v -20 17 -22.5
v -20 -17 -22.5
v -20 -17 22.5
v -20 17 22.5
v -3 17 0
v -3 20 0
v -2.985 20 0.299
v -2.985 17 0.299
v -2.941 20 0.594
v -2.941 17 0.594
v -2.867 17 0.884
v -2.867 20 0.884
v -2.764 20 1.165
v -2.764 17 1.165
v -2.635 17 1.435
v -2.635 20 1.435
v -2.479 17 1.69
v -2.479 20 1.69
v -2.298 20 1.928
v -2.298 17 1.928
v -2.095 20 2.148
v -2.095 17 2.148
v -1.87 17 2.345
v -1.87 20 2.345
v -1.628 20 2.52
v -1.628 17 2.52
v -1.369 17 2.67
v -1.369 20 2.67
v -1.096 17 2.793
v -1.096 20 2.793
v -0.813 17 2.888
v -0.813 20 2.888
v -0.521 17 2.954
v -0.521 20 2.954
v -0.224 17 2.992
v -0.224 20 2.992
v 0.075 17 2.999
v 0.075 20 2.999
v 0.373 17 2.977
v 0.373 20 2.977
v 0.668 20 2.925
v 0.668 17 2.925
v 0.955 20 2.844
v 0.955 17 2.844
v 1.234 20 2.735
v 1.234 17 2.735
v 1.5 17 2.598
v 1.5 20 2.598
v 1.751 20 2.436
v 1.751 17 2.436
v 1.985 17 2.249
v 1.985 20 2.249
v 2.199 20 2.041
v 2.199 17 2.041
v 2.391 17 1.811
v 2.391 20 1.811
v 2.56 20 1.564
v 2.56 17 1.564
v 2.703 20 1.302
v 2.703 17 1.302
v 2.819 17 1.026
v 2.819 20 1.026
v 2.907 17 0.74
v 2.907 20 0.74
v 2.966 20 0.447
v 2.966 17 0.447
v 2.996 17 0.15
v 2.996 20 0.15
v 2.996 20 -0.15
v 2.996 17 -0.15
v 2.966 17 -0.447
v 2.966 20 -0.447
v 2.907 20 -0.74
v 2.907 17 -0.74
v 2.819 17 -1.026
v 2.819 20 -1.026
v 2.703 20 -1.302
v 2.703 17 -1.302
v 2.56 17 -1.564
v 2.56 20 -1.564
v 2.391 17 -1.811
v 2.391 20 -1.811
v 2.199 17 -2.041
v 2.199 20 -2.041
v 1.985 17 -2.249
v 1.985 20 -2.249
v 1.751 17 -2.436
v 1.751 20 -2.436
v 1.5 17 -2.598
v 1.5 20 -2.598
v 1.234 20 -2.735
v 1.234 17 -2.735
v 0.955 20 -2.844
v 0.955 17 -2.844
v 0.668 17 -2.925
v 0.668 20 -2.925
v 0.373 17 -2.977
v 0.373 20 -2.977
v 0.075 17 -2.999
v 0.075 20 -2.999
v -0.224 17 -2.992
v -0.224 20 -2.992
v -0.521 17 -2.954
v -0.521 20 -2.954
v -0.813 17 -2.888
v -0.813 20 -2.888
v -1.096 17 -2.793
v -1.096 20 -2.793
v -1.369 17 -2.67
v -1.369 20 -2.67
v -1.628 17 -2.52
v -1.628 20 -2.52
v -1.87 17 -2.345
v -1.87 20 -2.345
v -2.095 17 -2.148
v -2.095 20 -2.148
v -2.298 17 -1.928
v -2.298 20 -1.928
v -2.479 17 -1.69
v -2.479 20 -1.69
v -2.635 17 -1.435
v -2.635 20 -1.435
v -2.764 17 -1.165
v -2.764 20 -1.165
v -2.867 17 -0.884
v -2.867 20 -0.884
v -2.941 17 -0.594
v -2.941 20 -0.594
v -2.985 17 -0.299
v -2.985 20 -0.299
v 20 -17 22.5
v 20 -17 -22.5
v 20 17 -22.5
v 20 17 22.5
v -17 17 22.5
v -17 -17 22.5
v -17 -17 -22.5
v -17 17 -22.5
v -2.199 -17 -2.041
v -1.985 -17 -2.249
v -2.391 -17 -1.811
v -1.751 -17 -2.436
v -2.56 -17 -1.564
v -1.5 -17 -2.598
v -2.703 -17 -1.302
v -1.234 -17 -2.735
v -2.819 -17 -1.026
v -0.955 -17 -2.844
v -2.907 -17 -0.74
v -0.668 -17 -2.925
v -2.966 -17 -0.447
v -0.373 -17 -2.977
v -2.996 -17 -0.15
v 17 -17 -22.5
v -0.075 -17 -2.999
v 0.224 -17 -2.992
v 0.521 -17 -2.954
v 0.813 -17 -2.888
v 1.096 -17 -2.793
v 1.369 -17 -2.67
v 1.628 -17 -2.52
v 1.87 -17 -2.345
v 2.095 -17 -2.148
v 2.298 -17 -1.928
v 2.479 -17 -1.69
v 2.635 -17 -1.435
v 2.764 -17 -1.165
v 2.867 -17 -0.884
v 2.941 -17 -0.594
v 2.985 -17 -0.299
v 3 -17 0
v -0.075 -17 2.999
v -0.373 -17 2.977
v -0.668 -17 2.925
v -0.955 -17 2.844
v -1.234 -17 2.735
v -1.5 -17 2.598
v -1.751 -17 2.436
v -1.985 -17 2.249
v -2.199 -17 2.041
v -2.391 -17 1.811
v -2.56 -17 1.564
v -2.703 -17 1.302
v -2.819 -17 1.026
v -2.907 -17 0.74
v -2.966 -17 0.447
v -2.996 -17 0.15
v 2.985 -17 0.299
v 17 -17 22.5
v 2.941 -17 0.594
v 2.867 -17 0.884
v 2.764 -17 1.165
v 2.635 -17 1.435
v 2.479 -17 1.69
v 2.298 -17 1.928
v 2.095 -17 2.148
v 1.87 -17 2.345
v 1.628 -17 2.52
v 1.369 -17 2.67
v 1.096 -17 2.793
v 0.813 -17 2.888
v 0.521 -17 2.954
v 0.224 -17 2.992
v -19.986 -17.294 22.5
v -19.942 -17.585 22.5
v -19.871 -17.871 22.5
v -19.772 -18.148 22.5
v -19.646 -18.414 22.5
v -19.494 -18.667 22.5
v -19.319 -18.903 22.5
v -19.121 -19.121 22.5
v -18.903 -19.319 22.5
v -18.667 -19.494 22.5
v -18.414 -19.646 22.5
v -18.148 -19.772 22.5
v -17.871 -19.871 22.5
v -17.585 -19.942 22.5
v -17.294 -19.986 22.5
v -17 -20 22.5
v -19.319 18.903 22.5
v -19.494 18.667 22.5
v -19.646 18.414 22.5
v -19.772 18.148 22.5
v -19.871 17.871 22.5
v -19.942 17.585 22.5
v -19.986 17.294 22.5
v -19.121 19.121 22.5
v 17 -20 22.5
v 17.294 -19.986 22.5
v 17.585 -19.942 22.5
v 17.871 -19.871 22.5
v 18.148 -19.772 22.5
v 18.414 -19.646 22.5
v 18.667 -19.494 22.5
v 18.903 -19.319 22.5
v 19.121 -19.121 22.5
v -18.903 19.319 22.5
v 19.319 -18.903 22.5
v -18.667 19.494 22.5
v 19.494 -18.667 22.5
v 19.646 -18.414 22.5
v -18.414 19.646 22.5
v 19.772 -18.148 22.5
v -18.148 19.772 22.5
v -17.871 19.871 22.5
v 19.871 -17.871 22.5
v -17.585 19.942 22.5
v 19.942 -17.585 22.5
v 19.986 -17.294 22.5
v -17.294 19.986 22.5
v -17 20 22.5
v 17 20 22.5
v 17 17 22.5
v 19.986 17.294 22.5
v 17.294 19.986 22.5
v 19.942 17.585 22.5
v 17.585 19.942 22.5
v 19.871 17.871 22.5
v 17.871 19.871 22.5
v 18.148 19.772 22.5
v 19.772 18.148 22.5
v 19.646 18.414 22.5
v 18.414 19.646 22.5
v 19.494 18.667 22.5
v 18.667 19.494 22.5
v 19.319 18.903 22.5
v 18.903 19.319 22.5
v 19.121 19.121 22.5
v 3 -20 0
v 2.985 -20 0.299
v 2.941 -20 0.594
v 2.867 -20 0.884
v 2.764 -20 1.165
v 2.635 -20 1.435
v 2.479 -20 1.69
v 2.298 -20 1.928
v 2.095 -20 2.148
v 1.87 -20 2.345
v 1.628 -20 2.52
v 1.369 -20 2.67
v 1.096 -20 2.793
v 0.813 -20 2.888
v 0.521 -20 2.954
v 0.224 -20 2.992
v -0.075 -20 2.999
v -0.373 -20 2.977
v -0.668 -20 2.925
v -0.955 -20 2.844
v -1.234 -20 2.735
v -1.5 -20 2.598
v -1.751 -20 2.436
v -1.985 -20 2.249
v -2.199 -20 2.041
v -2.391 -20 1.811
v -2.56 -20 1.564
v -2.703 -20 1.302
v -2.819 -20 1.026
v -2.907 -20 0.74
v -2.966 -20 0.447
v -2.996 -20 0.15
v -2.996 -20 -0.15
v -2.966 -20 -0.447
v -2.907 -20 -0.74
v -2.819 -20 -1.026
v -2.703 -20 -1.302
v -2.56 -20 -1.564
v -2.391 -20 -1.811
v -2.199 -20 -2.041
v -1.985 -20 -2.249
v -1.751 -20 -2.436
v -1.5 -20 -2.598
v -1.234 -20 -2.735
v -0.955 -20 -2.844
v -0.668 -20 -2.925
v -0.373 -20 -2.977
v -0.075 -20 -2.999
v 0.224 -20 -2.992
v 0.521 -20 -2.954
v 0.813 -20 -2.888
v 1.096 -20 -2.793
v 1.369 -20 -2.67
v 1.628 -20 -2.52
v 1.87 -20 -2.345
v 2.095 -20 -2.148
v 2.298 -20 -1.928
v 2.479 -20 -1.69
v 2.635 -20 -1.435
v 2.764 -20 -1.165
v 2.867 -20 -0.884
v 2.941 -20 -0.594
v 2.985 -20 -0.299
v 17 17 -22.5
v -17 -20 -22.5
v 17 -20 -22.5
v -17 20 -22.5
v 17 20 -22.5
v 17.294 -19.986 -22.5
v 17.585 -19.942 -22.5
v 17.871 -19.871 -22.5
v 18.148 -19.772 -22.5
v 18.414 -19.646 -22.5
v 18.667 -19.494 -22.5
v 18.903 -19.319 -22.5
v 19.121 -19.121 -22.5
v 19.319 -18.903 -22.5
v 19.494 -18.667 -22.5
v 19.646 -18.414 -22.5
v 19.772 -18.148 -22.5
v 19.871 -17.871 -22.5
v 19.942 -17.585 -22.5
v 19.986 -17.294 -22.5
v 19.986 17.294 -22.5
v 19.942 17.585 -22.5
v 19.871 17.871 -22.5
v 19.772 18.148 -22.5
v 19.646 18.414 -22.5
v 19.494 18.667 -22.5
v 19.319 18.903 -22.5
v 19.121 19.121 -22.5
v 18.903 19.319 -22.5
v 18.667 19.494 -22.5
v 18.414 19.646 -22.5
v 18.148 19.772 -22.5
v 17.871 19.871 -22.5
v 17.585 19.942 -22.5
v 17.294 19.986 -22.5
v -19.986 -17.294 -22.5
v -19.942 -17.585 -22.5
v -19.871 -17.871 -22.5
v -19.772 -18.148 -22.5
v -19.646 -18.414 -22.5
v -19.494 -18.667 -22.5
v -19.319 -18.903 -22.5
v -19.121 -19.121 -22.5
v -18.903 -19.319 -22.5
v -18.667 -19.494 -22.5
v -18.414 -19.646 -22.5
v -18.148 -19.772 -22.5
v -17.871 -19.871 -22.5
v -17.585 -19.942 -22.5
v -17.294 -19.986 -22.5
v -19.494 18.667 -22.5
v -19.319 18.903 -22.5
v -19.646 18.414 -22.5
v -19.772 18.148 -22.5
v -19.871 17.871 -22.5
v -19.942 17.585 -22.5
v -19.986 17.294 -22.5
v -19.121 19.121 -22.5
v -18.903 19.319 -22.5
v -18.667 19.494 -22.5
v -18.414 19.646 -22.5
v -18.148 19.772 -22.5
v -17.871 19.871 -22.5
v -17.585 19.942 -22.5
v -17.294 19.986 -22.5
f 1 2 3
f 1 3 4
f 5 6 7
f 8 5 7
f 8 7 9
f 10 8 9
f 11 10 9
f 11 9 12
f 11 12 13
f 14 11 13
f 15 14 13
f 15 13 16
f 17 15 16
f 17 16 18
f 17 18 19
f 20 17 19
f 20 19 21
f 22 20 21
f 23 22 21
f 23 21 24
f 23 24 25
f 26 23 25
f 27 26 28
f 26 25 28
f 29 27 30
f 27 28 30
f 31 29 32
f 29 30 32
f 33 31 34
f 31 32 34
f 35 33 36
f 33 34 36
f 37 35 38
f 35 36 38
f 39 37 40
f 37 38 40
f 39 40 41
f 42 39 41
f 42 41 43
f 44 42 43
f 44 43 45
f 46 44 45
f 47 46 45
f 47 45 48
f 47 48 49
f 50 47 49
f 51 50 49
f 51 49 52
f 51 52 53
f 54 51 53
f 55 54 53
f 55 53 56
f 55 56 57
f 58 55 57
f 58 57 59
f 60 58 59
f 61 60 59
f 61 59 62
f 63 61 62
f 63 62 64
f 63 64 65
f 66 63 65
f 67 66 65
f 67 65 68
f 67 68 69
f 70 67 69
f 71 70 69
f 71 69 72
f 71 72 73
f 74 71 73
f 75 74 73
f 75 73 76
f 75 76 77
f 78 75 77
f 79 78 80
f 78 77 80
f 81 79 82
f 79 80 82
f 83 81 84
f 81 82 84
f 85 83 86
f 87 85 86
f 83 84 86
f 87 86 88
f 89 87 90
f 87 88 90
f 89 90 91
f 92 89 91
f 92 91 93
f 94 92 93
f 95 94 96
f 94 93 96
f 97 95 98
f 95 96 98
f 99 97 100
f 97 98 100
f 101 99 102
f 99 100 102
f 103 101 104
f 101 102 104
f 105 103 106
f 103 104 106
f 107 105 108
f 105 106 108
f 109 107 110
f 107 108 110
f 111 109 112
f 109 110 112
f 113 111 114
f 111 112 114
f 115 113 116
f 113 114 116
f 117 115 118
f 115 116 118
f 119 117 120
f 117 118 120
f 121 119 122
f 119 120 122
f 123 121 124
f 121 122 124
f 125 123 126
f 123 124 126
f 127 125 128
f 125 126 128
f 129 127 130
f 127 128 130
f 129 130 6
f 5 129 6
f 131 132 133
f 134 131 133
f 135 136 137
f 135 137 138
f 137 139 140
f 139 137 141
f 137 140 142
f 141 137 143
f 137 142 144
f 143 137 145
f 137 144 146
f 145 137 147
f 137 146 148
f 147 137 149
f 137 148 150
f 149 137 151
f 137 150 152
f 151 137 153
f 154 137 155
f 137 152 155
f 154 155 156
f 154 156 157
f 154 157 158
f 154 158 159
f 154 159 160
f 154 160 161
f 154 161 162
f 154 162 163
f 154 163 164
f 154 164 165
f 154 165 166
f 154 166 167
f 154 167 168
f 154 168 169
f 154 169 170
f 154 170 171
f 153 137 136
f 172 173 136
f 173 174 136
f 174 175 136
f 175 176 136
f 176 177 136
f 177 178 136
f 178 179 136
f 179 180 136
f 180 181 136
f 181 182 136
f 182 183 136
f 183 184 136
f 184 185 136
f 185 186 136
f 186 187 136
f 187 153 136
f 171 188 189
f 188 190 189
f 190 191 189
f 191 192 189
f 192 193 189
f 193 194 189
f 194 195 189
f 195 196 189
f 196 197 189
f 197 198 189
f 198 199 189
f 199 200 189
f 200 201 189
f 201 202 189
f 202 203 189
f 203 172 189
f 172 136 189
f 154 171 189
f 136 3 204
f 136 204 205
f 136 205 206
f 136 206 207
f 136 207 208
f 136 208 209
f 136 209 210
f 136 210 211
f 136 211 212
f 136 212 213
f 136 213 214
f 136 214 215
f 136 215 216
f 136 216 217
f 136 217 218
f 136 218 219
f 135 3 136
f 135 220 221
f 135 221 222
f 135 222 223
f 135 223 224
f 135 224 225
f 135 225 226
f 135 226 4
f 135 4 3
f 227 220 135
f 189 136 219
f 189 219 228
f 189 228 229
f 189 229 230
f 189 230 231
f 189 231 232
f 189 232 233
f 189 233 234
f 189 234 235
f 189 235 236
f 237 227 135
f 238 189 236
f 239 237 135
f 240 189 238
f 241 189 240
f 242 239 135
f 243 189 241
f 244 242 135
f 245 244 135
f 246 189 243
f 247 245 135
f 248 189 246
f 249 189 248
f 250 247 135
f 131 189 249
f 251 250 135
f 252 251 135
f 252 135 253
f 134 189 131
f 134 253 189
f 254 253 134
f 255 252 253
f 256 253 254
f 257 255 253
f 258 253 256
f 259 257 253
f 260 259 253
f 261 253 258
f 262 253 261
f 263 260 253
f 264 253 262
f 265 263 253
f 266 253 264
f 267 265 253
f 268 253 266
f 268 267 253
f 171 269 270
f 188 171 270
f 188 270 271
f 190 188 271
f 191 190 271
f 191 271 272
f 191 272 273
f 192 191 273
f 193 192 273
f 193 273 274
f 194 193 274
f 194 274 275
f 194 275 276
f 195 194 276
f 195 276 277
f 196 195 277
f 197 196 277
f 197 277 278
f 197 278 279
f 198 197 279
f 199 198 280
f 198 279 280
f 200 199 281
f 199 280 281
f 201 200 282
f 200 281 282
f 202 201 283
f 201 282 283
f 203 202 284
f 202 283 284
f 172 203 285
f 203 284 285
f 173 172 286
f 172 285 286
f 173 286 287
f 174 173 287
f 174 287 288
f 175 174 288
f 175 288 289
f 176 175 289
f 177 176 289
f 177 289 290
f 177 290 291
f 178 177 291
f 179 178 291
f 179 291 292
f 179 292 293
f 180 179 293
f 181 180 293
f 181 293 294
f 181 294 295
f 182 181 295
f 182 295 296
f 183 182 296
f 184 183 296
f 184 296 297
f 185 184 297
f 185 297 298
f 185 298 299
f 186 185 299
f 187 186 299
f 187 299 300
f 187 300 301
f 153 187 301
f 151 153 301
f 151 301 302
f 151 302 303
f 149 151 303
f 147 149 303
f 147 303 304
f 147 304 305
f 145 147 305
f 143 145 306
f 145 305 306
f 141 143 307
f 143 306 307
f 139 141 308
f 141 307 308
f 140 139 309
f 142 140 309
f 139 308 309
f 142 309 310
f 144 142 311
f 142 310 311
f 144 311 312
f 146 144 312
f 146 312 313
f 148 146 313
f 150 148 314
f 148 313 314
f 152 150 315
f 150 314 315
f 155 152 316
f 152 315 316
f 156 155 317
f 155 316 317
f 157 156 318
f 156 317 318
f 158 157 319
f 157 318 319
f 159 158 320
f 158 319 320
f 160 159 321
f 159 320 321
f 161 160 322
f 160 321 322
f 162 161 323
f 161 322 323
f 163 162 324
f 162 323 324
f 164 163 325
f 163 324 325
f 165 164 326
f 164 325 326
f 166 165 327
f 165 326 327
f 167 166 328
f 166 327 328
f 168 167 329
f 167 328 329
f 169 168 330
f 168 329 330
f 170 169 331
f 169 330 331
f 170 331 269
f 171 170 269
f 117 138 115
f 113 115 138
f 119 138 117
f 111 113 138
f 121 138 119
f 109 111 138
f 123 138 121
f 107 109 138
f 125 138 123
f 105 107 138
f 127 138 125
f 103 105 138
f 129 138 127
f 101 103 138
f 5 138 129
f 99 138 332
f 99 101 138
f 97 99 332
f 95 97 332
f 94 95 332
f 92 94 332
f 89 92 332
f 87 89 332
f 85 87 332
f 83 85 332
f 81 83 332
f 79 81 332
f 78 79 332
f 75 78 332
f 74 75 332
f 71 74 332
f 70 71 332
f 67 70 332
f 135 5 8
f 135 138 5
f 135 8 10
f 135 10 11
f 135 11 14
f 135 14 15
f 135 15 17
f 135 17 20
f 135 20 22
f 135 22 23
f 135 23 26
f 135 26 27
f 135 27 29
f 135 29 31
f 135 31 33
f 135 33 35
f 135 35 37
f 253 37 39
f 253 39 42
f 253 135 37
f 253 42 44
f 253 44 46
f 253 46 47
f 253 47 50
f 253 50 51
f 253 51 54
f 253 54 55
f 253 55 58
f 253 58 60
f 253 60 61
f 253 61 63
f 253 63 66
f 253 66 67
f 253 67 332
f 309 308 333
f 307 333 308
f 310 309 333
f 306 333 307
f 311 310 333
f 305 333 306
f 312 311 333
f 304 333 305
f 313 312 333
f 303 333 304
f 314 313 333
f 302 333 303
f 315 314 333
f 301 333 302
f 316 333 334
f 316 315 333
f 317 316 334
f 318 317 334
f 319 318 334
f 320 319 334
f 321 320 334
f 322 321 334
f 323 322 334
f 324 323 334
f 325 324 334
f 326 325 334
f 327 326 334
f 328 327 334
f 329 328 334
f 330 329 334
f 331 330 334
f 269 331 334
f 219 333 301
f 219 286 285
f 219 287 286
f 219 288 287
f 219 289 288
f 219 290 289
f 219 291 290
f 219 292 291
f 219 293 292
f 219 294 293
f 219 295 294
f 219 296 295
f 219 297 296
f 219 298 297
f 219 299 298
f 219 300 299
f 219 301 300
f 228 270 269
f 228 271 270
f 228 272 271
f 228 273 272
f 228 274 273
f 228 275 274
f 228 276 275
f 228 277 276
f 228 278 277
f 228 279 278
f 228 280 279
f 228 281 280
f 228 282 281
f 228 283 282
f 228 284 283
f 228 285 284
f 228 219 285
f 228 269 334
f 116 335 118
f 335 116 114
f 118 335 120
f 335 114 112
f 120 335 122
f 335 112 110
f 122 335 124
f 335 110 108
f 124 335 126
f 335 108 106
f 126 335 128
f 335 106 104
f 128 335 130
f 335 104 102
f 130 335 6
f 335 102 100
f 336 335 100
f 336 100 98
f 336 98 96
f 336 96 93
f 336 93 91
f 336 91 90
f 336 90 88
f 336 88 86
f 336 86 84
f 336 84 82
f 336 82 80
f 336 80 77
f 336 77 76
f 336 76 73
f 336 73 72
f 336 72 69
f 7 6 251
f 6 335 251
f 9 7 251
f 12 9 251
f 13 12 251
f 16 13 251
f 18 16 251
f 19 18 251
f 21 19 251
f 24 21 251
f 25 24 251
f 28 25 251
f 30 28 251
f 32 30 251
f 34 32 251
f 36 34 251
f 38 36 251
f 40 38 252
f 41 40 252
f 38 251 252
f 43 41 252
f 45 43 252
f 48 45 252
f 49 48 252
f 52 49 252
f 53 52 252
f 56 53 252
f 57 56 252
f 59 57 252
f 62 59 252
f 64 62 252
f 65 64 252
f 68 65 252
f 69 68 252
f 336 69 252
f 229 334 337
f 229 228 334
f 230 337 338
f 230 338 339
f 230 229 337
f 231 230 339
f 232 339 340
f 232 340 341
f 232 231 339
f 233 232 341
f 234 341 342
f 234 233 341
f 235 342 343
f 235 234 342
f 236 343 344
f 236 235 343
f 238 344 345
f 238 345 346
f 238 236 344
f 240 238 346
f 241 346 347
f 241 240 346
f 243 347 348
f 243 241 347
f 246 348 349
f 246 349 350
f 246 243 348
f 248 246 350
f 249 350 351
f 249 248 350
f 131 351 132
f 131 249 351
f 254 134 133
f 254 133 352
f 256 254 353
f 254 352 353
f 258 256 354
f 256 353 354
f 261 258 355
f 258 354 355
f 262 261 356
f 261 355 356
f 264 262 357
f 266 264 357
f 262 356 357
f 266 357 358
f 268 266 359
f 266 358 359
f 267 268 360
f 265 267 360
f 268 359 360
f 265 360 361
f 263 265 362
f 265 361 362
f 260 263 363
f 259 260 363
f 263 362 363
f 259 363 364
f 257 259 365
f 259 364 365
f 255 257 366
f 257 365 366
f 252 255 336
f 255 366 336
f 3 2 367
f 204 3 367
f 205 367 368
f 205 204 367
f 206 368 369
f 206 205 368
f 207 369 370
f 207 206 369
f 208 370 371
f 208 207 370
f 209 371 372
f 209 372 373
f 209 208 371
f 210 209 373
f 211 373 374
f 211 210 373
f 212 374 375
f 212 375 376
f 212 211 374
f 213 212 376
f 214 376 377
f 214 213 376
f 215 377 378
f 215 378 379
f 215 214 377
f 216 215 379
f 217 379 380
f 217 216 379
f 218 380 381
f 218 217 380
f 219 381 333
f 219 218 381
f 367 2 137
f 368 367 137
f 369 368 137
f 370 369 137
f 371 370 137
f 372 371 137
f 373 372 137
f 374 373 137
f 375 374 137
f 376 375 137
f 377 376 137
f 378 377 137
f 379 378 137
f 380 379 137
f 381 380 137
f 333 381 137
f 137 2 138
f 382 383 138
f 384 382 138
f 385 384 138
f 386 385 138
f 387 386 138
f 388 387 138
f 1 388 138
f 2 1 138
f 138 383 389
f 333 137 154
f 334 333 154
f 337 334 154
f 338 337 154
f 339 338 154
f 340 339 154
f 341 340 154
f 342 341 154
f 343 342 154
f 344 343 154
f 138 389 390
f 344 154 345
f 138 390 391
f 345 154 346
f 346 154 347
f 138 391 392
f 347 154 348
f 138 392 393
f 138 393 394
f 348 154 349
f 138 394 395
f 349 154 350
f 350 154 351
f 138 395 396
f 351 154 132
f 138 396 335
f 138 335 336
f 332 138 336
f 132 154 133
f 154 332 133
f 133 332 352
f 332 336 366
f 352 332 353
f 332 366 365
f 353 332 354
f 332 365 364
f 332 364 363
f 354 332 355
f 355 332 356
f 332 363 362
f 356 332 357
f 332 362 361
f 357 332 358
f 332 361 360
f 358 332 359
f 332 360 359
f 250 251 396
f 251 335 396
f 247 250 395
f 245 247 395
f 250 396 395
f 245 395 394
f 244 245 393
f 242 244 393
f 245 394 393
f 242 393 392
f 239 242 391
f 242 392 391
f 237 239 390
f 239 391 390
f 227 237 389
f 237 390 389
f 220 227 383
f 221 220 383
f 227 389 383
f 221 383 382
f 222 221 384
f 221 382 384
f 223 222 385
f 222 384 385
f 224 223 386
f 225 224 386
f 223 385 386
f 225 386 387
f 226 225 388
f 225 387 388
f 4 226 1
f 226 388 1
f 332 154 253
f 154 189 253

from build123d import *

# Parameters (mm, degrees)
SKETCH_W       = 40
SKETCH_H       = 40
SKETCH_W_2     = 34
SKETCH_H_2     = 34
PAD_DEPTH      = 22.5
FILLET_R       = 3
FILLET001_R    = 3
FILLET002_R    = 3
FILLET003_R    = 3
SKETCH001_R    = 3
HOLE_DEPTH     = 23.197418
HOLE_TIPS_R    = 3
SKETCH002_R    = 3
HOLE001_DEPTH  = 23.197418
HOLE001_TIPS_R = 3


with BuildPart() as part:
    # Sketch → Pad (new body, symmetric)
    with BuildSketch(Plane.XY):
        Rectangle(SKETCH_W, SKETCH_H)
        Rectangle(SKETCH_W_2, SKETCH_H_2, mode=Mode.SUBTRACT)
    extrude(amount=PAD_DEPTH, both=True)

    # Fillet
    fillet_edges = [part.edges().sort_by_distance(p)[0] for p in [
        (-20, -20, 0),
    ]]
    fillet(fillet_edges, radius=FILLET_R)

    # Fillet001
    fillet001_edges = [part.edges().sort_by_distance(p)[0] for p in [
        (20, -20, 0),
    ]]
    fillet(fillet001_edges, radius=FILLET001_R)

    # Fillet002
    fillet002_edges = [part.edges().sort_by_distance(p)[0] for p in [
        (20, 20, 0),
    ]]
    fillet(fillet002_edges, radius=FILLET002_R)

    # Fillet003
    fillet003_edges = [part.edges().sort_by_distance(p)[0] for p in [
        (-20, 20, 0),
    ]]
    fillet(fillet003_edges, radius=FILLET003_R)

    # Sketch001 (on Face2 of Fillet003) → Hole (cut)
    with BuildSketch(Plane(origin=(0, 20, 0), x_dir=(-1, 0, 0), z_dir=(0, 1, 0))):
        Circle(SKETCH001_R)
    extrude(amount=-HOLE_DEPTH, mode=Mode.SUBTRACT)

    # Hole tips → Hole tip 1 section 0
    with BuildSketch(Plane(origin=(0, -3.197418, 0), x_dir=(-1, 0, 0), z_dir=(0, 1, 0)), mode=Mode.PRIVATE) as hole_tip_1_s0:
        Circle(HOLE_TIPS_R)
    loft([hole_tip_1_s0.sketch, Vertex(0, -5, 0)], mode=Mode.SUBTRACT)

    # Sketch002 (on Face9 of Hole) → Hole001 (cut)
    with BuildSketch(Plane.XZ.offset(20)):
        Circle(SKETCH002_R)
    extrude(amount=-HOLE001_DEPTH, mode=Mode.SUBTRACT)

    # Hole001 tips → Hole001 tip 1 section 0
    with BuildSketch(Plane.XZ.offset(-3.197418), mode=Mode.PRIVATE) as hole001_tip_1_s0:
        Circle(HOLE001_TIPS_R)
    loft([hole001_tip_1_s0.sketch, Vertex(0, 5, 0)], mode=Mode.SUBTRACT)


solid = part.part
